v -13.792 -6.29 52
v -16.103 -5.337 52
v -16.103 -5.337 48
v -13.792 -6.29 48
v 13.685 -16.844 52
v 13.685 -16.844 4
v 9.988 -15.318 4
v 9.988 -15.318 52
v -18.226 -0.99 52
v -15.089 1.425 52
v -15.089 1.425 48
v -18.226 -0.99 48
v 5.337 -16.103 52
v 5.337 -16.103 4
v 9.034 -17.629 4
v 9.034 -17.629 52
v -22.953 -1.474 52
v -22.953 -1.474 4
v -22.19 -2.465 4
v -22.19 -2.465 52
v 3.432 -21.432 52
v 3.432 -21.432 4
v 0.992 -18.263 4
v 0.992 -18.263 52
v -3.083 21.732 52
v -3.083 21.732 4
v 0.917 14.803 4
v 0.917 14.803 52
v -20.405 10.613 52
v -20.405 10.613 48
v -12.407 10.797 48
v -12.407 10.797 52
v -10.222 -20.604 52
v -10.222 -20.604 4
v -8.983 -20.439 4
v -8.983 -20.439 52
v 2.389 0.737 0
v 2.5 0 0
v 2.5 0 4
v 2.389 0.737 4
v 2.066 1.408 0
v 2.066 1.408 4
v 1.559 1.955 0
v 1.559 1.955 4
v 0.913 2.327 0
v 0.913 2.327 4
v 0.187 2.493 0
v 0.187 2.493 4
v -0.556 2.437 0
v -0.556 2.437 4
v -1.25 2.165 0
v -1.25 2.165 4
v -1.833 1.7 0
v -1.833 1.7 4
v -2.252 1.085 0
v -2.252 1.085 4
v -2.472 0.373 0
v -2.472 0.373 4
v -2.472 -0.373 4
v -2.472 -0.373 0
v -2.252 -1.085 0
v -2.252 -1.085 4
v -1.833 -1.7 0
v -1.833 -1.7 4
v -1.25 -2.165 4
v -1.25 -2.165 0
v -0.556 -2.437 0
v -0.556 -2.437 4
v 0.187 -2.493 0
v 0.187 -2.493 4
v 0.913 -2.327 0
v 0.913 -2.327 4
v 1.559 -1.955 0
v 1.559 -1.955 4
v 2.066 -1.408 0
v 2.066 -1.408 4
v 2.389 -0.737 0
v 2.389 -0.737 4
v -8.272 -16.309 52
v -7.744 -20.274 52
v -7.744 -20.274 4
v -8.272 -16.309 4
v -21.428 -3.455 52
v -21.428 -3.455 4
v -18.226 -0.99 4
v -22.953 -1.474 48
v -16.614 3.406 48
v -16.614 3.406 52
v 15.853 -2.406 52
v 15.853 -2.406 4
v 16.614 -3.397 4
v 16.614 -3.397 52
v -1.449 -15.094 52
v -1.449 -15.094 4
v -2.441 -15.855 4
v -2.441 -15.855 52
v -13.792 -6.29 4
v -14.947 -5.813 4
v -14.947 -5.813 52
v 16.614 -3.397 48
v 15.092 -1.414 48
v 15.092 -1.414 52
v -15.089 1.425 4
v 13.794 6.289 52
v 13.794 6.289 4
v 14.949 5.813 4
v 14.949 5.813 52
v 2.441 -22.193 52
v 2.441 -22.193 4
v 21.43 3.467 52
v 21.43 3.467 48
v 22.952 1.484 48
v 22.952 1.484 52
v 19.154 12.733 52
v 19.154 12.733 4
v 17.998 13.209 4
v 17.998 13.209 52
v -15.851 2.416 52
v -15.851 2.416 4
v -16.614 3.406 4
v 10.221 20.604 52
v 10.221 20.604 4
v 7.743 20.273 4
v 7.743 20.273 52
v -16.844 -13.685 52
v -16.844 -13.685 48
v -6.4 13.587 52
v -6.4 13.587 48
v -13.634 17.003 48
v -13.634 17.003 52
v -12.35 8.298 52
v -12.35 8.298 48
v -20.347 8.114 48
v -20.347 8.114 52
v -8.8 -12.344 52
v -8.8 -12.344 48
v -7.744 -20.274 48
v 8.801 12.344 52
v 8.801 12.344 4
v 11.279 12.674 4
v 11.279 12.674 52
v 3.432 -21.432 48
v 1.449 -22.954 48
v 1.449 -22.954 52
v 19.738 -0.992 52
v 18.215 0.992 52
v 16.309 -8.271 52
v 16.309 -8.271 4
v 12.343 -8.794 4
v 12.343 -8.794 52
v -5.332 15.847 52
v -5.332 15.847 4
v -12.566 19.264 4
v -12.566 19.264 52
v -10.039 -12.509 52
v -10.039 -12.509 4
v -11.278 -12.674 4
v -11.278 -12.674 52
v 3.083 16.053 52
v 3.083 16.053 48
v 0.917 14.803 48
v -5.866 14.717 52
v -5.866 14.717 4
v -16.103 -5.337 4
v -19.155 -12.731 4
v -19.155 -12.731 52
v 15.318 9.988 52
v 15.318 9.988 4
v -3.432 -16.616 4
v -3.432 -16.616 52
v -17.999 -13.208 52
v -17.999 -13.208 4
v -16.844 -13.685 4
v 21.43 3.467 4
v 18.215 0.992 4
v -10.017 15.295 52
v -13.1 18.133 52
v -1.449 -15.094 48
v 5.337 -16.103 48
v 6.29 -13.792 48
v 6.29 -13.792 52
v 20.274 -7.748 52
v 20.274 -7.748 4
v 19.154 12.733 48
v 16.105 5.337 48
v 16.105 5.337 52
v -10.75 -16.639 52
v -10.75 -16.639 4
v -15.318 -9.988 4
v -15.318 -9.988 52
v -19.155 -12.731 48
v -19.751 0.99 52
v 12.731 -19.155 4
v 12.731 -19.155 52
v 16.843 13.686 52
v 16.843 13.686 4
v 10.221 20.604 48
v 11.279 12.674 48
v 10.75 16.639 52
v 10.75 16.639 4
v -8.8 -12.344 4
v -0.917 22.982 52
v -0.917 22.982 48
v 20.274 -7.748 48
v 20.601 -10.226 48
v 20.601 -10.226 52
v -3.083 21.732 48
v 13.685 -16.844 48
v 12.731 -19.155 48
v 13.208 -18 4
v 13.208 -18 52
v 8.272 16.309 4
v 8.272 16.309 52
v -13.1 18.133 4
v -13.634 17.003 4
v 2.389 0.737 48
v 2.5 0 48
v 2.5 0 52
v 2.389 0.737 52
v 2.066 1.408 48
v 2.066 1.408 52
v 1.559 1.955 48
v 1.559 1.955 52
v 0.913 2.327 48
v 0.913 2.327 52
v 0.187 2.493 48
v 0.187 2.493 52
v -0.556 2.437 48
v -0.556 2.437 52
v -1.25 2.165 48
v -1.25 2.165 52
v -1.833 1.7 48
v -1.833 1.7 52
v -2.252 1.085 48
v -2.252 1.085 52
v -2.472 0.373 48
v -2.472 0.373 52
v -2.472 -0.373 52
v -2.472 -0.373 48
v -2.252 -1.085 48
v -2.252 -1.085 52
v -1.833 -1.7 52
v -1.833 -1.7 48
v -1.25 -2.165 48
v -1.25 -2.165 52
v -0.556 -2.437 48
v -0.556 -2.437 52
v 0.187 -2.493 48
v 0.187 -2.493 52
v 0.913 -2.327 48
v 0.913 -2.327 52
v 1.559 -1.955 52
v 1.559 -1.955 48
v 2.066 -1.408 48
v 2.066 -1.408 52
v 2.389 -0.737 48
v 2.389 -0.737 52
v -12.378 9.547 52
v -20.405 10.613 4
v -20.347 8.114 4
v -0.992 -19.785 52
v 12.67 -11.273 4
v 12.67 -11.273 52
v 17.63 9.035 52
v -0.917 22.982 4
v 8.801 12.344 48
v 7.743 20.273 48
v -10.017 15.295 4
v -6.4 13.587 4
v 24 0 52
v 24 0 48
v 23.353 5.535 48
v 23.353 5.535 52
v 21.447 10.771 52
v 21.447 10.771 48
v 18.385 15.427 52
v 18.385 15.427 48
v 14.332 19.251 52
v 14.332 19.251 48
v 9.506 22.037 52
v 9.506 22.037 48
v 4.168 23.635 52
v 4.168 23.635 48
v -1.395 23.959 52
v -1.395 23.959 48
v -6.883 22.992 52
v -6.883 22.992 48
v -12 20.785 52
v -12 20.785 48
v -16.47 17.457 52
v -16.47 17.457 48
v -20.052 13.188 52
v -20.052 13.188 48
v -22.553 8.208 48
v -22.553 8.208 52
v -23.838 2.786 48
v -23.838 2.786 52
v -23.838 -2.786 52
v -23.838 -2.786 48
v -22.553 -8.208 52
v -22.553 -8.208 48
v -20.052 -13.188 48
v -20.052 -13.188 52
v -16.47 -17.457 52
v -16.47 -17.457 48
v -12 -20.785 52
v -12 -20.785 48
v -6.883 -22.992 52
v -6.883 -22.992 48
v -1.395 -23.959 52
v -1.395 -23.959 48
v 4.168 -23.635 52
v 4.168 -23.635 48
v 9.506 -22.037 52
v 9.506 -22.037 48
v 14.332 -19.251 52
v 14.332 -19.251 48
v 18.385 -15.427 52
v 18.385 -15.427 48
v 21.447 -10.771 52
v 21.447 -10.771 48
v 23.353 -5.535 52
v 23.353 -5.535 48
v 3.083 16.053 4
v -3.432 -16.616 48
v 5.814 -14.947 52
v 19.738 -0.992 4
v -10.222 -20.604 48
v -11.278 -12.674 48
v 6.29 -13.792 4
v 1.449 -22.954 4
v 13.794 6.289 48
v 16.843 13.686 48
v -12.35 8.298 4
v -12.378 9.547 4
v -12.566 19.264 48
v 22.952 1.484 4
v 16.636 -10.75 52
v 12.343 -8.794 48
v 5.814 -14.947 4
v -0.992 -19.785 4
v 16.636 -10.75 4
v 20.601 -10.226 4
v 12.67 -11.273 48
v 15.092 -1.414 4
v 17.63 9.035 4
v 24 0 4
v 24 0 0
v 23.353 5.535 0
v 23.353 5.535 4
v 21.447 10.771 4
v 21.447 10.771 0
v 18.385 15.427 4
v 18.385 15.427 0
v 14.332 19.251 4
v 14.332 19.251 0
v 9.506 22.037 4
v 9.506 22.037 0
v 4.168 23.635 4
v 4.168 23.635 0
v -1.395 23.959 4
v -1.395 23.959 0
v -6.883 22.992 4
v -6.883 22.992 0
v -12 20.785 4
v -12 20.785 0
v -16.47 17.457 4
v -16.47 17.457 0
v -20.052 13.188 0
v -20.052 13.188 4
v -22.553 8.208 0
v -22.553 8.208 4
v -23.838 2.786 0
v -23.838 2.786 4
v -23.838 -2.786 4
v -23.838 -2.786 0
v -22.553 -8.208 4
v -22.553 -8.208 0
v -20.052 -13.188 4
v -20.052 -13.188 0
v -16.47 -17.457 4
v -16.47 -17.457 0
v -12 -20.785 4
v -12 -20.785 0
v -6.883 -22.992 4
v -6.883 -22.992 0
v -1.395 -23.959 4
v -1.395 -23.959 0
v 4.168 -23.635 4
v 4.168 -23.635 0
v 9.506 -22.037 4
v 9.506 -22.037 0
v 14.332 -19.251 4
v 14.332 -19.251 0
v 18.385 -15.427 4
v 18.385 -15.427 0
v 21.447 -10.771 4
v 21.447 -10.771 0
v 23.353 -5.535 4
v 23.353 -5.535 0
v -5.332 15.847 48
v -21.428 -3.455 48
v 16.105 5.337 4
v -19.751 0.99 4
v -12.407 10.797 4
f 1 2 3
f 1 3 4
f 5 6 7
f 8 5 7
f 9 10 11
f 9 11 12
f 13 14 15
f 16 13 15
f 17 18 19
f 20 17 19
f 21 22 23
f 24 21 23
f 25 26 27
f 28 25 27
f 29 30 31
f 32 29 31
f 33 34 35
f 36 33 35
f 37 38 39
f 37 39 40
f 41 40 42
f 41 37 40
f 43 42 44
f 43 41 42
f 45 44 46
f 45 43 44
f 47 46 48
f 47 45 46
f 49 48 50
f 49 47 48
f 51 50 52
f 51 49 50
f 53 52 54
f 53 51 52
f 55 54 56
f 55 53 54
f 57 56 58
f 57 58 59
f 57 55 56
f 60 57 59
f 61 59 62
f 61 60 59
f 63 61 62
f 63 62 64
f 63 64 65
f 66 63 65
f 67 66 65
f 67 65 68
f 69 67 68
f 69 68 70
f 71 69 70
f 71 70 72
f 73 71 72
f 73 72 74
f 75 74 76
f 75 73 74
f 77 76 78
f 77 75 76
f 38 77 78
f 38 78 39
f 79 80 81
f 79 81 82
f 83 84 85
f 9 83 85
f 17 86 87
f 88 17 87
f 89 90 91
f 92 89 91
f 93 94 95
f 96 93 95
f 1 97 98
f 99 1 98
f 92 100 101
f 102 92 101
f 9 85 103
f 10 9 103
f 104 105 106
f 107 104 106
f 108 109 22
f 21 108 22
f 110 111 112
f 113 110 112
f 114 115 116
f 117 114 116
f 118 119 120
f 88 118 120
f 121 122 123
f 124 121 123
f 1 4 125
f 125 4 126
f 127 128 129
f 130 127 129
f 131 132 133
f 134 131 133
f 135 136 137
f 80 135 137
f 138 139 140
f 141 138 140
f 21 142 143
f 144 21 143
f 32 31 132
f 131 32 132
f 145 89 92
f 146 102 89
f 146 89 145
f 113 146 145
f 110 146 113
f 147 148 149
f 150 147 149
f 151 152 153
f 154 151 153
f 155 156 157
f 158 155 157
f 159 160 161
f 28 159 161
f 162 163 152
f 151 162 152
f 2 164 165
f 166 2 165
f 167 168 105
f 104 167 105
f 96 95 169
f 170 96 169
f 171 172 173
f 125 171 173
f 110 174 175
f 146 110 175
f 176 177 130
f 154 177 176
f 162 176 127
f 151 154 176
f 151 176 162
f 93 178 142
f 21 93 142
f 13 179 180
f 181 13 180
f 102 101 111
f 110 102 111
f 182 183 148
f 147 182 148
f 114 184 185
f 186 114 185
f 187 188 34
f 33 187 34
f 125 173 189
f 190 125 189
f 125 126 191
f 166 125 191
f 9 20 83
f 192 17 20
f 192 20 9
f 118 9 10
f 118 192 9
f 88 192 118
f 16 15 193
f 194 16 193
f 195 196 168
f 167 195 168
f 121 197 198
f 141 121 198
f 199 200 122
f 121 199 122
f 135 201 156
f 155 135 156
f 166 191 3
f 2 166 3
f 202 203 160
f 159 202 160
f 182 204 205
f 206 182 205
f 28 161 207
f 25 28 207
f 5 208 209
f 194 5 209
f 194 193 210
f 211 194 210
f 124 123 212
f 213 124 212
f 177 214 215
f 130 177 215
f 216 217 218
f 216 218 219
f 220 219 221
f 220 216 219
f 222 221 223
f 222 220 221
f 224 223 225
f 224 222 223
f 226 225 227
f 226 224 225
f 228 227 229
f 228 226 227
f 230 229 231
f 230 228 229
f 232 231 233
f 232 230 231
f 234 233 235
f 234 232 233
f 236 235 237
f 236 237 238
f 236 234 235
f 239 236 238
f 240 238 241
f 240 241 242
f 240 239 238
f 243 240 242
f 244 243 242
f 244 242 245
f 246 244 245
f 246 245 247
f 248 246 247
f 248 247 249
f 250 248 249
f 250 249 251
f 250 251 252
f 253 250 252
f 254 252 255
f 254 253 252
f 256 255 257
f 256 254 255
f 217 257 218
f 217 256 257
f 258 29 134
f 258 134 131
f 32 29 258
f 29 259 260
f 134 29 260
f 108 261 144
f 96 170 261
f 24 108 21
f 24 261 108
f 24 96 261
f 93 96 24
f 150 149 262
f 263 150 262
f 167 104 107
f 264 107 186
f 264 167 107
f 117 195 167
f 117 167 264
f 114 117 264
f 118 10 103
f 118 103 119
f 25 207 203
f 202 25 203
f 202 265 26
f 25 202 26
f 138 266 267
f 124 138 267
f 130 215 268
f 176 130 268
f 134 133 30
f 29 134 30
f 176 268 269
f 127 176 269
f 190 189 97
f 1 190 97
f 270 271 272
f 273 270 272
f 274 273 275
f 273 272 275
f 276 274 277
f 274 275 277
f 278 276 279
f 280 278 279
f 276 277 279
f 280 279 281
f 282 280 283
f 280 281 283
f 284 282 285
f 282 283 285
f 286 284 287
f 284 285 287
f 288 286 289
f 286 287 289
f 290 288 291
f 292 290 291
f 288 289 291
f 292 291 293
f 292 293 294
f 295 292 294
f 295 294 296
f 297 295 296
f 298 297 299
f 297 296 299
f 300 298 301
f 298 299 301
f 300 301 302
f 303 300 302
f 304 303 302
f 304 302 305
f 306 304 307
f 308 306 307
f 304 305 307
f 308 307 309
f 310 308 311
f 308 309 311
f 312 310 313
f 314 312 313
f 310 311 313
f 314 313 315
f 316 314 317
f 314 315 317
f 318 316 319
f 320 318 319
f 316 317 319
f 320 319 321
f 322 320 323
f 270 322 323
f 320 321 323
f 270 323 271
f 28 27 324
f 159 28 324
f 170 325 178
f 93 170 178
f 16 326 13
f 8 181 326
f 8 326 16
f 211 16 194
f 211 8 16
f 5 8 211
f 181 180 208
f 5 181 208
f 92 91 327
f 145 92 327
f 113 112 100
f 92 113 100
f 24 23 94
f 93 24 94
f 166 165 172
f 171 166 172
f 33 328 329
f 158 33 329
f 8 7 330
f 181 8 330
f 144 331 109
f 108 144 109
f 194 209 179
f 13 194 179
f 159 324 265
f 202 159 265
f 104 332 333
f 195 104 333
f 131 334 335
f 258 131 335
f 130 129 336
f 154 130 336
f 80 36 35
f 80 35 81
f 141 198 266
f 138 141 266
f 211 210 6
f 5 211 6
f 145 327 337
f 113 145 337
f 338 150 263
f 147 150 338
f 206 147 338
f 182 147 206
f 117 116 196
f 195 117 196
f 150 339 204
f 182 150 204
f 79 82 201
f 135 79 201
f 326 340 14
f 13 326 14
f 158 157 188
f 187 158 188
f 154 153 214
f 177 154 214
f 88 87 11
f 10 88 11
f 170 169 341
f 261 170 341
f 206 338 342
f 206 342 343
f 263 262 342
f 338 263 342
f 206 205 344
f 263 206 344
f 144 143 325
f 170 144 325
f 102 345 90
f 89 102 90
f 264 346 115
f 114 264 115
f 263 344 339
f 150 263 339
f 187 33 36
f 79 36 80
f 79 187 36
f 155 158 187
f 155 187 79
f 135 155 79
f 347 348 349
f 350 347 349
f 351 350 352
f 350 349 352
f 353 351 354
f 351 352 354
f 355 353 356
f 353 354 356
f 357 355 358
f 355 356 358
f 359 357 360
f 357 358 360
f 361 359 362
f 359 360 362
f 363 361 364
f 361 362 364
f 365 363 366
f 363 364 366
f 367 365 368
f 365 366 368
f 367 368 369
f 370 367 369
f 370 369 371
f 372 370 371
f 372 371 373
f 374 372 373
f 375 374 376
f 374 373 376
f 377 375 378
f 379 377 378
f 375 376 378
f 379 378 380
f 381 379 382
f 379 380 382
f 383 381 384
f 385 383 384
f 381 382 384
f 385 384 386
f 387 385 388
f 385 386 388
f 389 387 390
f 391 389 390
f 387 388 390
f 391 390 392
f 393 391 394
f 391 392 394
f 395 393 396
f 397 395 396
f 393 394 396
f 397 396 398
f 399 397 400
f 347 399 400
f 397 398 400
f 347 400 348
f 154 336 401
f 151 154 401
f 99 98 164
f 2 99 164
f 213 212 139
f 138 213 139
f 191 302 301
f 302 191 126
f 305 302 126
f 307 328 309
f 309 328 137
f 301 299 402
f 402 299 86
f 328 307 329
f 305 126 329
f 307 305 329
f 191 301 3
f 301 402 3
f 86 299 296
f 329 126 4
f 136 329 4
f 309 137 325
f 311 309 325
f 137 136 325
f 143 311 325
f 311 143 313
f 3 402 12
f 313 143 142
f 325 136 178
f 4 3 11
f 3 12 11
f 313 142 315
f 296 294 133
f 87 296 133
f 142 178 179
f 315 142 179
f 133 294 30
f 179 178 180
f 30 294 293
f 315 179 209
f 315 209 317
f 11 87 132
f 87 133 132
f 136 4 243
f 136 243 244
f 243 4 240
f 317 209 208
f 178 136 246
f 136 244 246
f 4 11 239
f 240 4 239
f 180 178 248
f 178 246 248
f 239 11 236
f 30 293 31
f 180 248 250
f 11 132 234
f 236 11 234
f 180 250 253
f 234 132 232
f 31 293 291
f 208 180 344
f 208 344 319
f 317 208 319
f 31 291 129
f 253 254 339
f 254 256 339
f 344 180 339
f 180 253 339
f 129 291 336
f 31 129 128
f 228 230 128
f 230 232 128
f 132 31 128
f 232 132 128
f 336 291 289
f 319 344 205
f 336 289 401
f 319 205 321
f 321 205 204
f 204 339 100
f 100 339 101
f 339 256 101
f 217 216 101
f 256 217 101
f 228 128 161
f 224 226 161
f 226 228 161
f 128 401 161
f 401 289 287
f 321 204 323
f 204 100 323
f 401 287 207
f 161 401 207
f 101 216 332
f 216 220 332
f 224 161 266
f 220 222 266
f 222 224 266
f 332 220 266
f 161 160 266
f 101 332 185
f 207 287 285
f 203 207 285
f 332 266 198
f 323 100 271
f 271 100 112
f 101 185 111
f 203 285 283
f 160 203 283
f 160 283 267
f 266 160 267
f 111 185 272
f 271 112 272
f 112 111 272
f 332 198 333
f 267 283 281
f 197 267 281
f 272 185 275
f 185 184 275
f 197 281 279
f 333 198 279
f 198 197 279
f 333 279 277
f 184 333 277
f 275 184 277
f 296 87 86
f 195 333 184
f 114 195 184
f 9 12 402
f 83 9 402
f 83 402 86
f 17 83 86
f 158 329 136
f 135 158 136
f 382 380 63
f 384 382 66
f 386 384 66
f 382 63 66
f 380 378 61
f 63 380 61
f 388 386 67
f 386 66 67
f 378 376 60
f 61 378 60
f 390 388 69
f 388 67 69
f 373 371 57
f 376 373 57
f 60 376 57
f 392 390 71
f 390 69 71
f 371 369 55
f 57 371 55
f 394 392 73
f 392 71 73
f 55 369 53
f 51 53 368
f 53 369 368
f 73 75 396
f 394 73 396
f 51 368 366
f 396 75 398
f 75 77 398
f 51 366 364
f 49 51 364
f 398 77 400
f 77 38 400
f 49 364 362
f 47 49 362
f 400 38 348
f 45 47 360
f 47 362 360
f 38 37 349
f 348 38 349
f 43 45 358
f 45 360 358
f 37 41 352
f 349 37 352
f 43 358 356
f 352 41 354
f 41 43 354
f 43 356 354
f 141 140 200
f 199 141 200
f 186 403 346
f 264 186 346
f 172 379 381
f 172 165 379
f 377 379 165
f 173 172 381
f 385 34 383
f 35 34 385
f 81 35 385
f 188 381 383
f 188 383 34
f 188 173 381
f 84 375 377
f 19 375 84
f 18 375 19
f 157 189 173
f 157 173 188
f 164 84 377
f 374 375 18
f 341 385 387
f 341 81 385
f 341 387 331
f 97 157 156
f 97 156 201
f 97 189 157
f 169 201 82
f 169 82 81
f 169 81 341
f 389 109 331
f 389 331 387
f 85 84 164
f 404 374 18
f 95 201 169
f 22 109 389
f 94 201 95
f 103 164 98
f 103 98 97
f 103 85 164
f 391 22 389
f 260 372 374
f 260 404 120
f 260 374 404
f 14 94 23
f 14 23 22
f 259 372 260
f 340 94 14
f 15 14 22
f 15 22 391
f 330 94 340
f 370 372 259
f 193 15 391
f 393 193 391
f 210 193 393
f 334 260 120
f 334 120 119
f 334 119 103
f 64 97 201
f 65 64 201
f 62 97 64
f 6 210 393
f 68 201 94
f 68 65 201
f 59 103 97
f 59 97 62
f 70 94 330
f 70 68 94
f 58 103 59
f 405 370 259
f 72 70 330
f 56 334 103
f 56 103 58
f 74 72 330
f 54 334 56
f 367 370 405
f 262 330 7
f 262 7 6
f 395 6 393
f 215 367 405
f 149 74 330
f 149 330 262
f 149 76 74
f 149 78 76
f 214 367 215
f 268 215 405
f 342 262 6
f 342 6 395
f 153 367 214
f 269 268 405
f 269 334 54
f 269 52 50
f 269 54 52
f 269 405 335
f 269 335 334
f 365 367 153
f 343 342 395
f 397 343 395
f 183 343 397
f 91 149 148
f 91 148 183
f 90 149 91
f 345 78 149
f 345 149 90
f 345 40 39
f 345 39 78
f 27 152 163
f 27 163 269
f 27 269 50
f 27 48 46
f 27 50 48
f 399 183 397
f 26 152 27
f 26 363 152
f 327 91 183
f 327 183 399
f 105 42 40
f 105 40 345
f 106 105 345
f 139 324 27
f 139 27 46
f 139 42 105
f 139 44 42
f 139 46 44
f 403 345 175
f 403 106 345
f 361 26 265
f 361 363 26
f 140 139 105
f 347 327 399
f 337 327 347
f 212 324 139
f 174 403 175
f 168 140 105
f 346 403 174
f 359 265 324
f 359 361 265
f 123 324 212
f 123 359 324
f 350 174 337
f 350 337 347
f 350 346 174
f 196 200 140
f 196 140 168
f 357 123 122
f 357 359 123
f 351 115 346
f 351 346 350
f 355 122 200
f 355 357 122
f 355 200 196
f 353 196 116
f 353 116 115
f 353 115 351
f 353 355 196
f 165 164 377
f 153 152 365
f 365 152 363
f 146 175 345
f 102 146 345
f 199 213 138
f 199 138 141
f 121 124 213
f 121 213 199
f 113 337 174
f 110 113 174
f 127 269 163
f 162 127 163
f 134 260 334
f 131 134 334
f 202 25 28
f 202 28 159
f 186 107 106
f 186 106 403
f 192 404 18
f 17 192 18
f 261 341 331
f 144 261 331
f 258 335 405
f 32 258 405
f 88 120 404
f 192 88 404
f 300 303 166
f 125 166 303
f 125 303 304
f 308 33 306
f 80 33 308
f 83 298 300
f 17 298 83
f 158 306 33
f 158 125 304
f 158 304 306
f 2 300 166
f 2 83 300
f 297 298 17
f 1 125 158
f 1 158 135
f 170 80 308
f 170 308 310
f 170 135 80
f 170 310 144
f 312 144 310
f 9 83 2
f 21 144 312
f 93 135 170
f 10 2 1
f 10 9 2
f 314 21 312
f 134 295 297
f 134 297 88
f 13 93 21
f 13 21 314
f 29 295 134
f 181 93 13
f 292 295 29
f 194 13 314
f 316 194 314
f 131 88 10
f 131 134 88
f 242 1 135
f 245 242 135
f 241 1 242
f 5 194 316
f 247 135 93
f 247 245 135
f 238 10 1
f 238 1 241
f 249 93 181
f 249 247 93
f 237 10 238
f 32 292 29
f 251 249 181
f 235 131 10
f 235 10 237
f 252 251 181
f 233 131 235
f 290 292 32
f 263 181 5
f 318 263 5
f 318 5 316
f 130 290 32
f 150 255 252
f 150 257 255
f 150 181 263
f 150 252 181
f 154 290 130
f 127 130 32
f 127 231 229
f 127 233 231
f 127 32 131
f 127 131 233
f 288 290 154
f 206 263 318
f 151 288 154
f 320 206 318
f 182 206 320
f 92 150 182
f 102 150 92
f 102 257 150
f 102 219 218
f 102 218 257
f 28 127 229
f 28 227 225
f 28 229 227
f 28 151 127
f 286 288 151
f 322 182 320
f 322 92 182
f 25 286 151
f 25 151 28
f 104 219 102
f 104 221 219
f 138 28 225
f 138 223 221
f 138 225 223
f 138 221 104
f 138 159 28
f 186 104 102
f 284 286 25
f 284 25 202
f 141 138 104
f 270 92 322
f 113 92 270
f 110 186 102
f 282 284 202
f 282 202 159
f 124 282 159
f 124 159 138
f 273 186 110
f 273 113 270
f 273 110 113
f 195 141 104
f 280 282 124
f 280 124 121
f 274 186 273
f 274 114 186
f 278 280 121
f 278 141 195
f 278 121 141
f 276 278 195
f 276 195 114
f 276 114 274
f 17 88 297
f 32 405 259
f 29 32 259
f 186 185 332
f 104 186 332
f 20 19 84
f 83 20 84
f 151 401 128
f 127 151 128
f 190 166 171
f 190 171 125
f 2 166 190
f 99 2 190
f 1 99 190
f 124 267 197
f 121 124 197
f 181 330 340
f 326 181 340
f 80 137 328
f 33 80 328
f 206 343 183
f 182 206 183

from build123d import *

# Parameters (mm, degrees)
F0_R        = 24
F0_R_2      = 2.5
F1_DEPTH    = 4
F2_DEPTH    = 52
F3_START    = 44
F1_FACE_R   = 24
F1_FACE_R_2 = 2.5
F3_DEPTH    = 4


# Not quite as in the source:
# - ends of sketch curves that miss each other by under 0.0002 mm in the source are joined


with BuildPart() as f1:
    # F0 (on Top) → F1 (new body)
    with BuildSketch(Plane.XY):
        Circle(F0_R)
        Polygon((-8.9827740816, -20.4386470385), (-10.2218230987, -20.6037455949), (-10.7501384793, -16.6387887403), (-11.2784538598, -12.6738318857), (-10.0394048428, -12.5087333293), (-8.8003558257, -12.3436347729), (-8.2720404452, -16.3085916275), (-7.7437250646, -20.273548482), align=None, mode=Mode.SUBTRACT)
        Polygon((-17.9994299012, -13.2083639741), (-19.154884362, -12.7314730129), (-17.6288332862, -9.0340187381), (-16.1027822104, -5.3365644633), (-14.9473277496, -5.8134554245), (-13.7918732887, -6.2903463857), (-15.3179243645, -9.9878006605), (-16.8439754403, -13.6852549352), align=None, mode=Mode.SUBTRACT)
        Polygon((-22.1901674017, -2.4646747911), (-22.9527062815, -1.4742029558), (-19.7513076007, 0.9904718354), (-16.613686535, 3.4060458753), (-15.8511476551, 2.4155740399), (-15.0886087753, 1.4251022046), (-18.226229841, -0.9904718354), (-21.4276285218, -3.4551466265), align=None, mode=Mode.SUBTRACT)
        Polygon((2.4405882298, -22.1931875166), (1.4490252381, -22.954309527), (-0.9915629917, -19.7851505161), (-3.4321512214, -16.6159915053), (-2.4405882298, -15.8548694949), (-1.4490252381, -15.0937474845), (0.9915629917, -18.2629064954), (3.4321512214, -21.4320655062), align=None, mode=Mode.SUBTRACT)
        Polygon((13.2082589659, -17.9995611772), (12.7313109402, -19.1549920841), (9.0339320379, -17.6287584019), (5.3365531356, -16.1025247196), (5.8135011613, -14.9470938127), (6.290449187, -13.7916629057), (9.9878280893, -15.3178965879), (13.6852069916, -16.8441302702), align=None, mode=Mode.SUBTRACT)
        Polygon((20.4379798112, -8.9871546743), (20.6014655966, -10.2264175189), (16.6358244939, -10.7495720322), (12.6701833913, -11.2727265454), (12.5066976059, -10.0334637008), (12.3432118205, -8.7942008562), (16.3088529232, -8.271046343), (20.2744940258, -7.7478918297), align=None, mode=Mode.SUBTRACT)
        Polygon((-20.3762131188, 9.3633951434), (-20.4049716149, 10.6130642792), (-16.4060303805, 10.7050914668), (-12.407089146, 10.7971186544), (-12.3783306499, 9.5474495186), (-12.3495721537, 8.2977803828), (-16.3485133882, 8.2057531952), (-20.3474546227, 8.1137260076), align=None, mode=Mode.SUBTRACT)
        Polygon((-13.1000797836, 18.1333488537), (-12.5662981354, 19.2636484388), (-8.9493394632, 17.5555471644), (-5.332380791, 15.84744589), (-5.8661624392, 14.7171463049), (-6.3999440875, 13.5868467198), (-10.0169027597, 15.2949479943), (-13.6338614319, 17.0030492687), align=None, mode=Mode.SUBTRACT)
        Circle(F0_R_2, mode=Mode.SUBTRACT)
        Polygon((22.1909529643, 2.4755624376), (22.9520749747, 1.4839994459), (19.737501164, -0.9915629917), (16.613756953, -3.3971770136), (15.8526349426, -2.4056140219), (15.0915129323, -1.4140510302), (18.2152571432, 0.9915629917), (21.4298309539, 3.4671254293), align=None, mode=Mode.SUBTRACT)
        Polygon((17.9982494725, 13.2093081016), (19.1539156294, 12.73293038), (17.6295069203, 9.0347986777), (16.1050982111, 5.3366669754), (14.9494320542, 5.813044697), (13.7937658972, 6.2894224186), (15.3181746063, 9.9875541209), (16.8425833155, 13.6856858232), align=None, mode=Mode.SUBTRACT)
        Polygon((8.9820708555, 20.4387540345), (10.2210853338, 20.6041115945), (10.7502295258, 16.6392652641), (11.2793737179, 12.6744189336), (10.0403592396, 12.5090613736), (8.8013447613, 12.3437038136), (8.2722005693, 16.3085501441), (7.7430563772, 20.2733964745), align=None, mode=Mode.SUBTRACT)
        Polygon((-2, 22.3566939084), (-0.9174682099, 22.9816938471), (1.0825317901, 19.517592232), (3.0825317901, 16.0534906169), (2, 15.4284906782), (0.9174682099, 14.8034907395), (-3.0825317901, 14.8034907395), (-3.0825317901, 21.7316939697), align=None, mode=Mode.SUBTRACT)
        Polygon((-1.0825317901, 18.2675923546), (-3.0825317901, 21.7316939697), (-3.0825317901, 14.8034907395), (0.9174682099, 14.8034907395), align=None)
    extrude(amount=F1_DEPTH)

    # F0 (on Top) → F2 (join)
    with BuildSketch(Plane.XY):
        Polygon((11.2793737179, 12.6744189336), (10.7502295258, 16.6392652641), (9.5112150476, 16.4739077041), (10.0403592396, 12.5090613736), align=None)
        Polygon((10.0403592396, 12.5090613736), (9.5112150476, 16.4739077041), (8.2722005693, 16.3085501441), (8.8013447613, 12.3437038136), align=None)
        Polygon((10.7502295258, 16.6392652641), (10.2210853338, 20.6041115945), (8.9820708555, 20.4387540345), (9.5112150476, 16.4739077041), align=None)
        Polygon((9.5112150476, 16.4739077041), (8.9820708555, 20.4387540345), (7.7430563772, 20.2733964745), (8.2722005693, 16.3085501441), align=None)
        Polygon((3.0825317901, 16.0534906169), (1.0825317901, 19.517592232), (0, 18.8925922933), (2, 15.4284906782), align=None)
        Polygon((2, 15.4284906782), (0, 18.8925922933), (-1.0825317901, 18.2675923546), (0.9174682099, 14.8034907395), align=None)
        Polygon((1.0825317901, 19.517592232), (-0.9174682099, 22.9816938471), (-2, 22.3566939084), (0, 18.8925922933), align=None)
        Polygon((0, 18.8925922933), (-2, 22.3566939084), (-3.0825317901, 21.7316939697), (-1.0825317901, 18.2675923546), align=None)
        Polygon((-8.9493394632, 17.5555471644), (-12.5662981354, 19.2636484388), (-13.1000797836, 18.1333488537), (-9.4831211114, 16.4252475793), align=None)
        Polygon((-9.4831211114, 16.4252475793), (-13.1000797836, 18.1333488537), (-13.6338614319, 17.0030492687), (-10.0169027597, 15.2949479943), align=None)
        Polygon((-5.332380791, 15.84744589), (-8.9493394632, 17.5555471644), (-9.4831211114, 16.4252475793), (-5.8661624392, 14.7171463049), align=None)
        Polygon((-5.8661624392, 14.7171463049), (-9.4831211114, 16.4252475793), (-10.0169027597, 15.2949479943), (-6.3999440875, 13.5868467198), align=None)
        Polygon((-12.407089146, 10.7971186544), (-16.4060303805, 10.7050914668), (-16.3772718843, 9.455422331), (-12.3783306499, 9.5474495186), align=None)
        Polygon((-16.4060303805, 10.7050914668), (-20.4049716149, 10.6130642792), (-20.3762131188, 9.3633951434), (-16.3772718843, 9.455422331), align=None)
        Polygon((-16.3772718843, 9.455422331), (-20.3762131188, 9.3633951434), (-20.3474546227, 8.1137260076), (-16.3485133882, 8.2057531952), align=None)
        Polygon((-12.3783306499, 9.5474495186), (-16.3772718843, 9.455422331), (-16.3485133882, 8.2057531952), (-12.3495721537, 8.2977803828), align=None)
        Polygon((-16.613686535, 3.4060458753), (-19.7513076007, 0.9904718354), (-18.9887687209, 0), (-15.8511476551, 2.4155740399), align=None)
        Polygon((-19.7513076007, 0.9904718354), (-22.9527062815, -1.4742029558), (-22.1901674017, -2.4646747911), (-18.9887687209, 0), align=None)
        Polygon((-18.9887687209, 0), (-22.1901674017, -2.4646747911), (-21.4276285218, -3.4551466265), (-18.226229841, -0.9904718354), align=None)
        Polygon((-15.8511476551, 2.4155740399), (-18.9887687209, 0), (-18.2262279469, -0.9904742957), (-15.0886087753, 1.4251022046), align=None)
        Polygon((-16.1027822104, -5.3365644633), (-17.6288332862, -9.0340187381), (-16.4733788254, -9.5109096993), (-14.9473277496, -5.8134554245), align=None)
        Polygon((-14.9473277496, -5.8134554245), (-16.4733788254, -9.5109096993), (-15.3179243645, -9.9878006605), (-13.7918732887, -6.2903463857), align=None)
        Polygon((-16.4733788254, -9.5109096993), (-17.9994299012, -13.2083639741), (-16.8439754403, -13.6852549352), (-15.3179243645, -9.9878006605), align=None)
        Polygon((-17.6288332862, -9.0340187381), (-19.154884362, -12.7314730129), (-17.9994299012, -13.2083639741), (-16.4733788254, -9.5109096993), align=None)
        Polygon((-10.7501384793, -16.6387887403), (-10.2218230987, -20.6037455949), (-8.9827740816, -20.4386470385), (-9.5110894622, -16.4736901839), align=None)
        Polygon((-9.5110894622, -16.4736901839), (-8.9827740816, -20.4386470385), (-7.7437250646, -20.273548482), (-8.2720404452, -16.3085916275), align=None)
        Polygon((-11.2784538598, -12.6738318857), (-10.7501384793, -16.6387887403), (-9.5110894622, -16.4736901839), (-10.0394048428, -12.5087333293), align=None)
        Polygon((-10.0394048428, -12.5087333293), (-9.5110894622, -16.4736901839), (-8.2720404452, -16.3085916275), (-8.8003558257, -12.3436347729), align=None)
        Polygon((-3.4321512214, -16.6159915053), (-0.9915629917, -19.7851505161), (0, -19.0240285057), (-2.4405882298, -15.8548694949), align=None)
        Polygon((-2.4405882298, -15.8548694949), (0, -19.0240285057), (0.9915629917, -18.2629064954), (-1.4490252381, -15.0937474845), align=None)
        Polygon((0, -19.0240285057), (2.4405882298, -22.1931875166), (3.4321512214, -21.4320655062), (0.9915629917, -18.2629064954), align=None)
        Polygon((-0.9915629917, -19.7851505161), (1.4490252381, -22.954309527), (2.4405882298, -22.1931875166), (0, -19.0240285057), align=None)
        Polygon((9.0339320379, -17.6287584019), (12.7313109402, -19.1549920841), (13.2082589659, -17.9995611772), (9.5108800636, -16.4733274949), align=None)
        Polygon((5.3365531356, -16.1025247196), (9.0339320379, -17.6287584019), (9.5108800636, -16.4733274949), (5.8135011613, -14.9470938127), align=None)
        Polygon((5.8135011613, -14.9470938127), (9.5108800636, -16.4733274949), (9.9878280893, -15.3178965879), (6.290449187, -13.7916629057), align=None)
        Polygon((9.5108800636, -16.4733274949), (13.2082589659, -17.9995611772), (13.6852069916, -16.8441302702), (9.9878280893, -15.3178965879), align=None)
        Polygon((12.6701833913, -11.2727265454), (16.6358244939, -10.7495720322), (16.4723387086, -9.5103091876), (12.5066976059, -10.0334637008), align=None)
        Polygon((16.6358244939, -10.7495720322), (20.6014655966, -10.2264175189), (20.4379798112, -8.9871546743), (16.4723387086, -9.5103091876), align=None)
        Polygon((12.5066976059, -10.0334637008), (16.4723387086, -9.5103091876), (16.3088529232, -8.271046343), (12.3432118205, -8.7942008562), align=None)
        Polygon((16.4723387086, -9.5103091876), (20.4379798112, -8.9871546743), (20.2744940258, -7.7478918297), (16.3088529232, -8.271046343), align=None)
        Polygon((16.613756953, -3.3971770136), (19.737501164, -0.9915629917), (18.9763791536, 0), (15.8526349426, -2.4056140219), align=None)
        Polygon((19.737501164, -0.9915629917), (22.9520749747, 1.4839994459), (22.1909529643, 2.4755624376), (18.9763791536, 0), align=None)
        Polygon((18.9763791536, 0), (22.1909529643, 2.4755624376), (21.4298309539, 3.4671254293), (18.2152571432, 0.9915629917), align=None)
        Polygon((15.8526349426, -2.4056140219), (18.9763791536, 0), (18.2152571432, 0.9915629917), (15.0915129323, -1.4140510302), align=None)
        Polygon((16.1050982111, 5.3366669754), (17.6295069203, 9.0347986777), (16.4738407633, 9.5111763993), (14.9494320542, 5.813044697), align=None)
        Polygon((14.9494320542, 5.813044697), (16.4738407633, 9.5111763993), (15.3181746063, 9.9875541209), (13.7937658972, 6.2894224186), align=None)
        Polygon((16.4738407633, 9.5111763993), (17.9982494725, 13.2093081016), (16.8425833155, 13.6856858232), (15.3181746063, 9.9875541209), align=None)
        Polygon((17.6295069203, 9.0347986777), (19.1539156294, 12.73293038), (17.9982494725, 13.2093081016), (16.4738407633, 9.5111763993), align=None)
    extrude(amount=F2_DEPTH)


with BuildPart() as f3:
    # F1_face (on face) → F3 (new body)
    with BuildSketch(Plane(origin=(-0.0016074104, 0.0028842551, 4), x_dir=(1, 0, 0), z_dir=(0, 0, 1)).offset(F3_START)):
        with Locations((0.0016074104, -0.0028842551)):
            Circle(F1_FACE_R)
        Polygon((-7.7421176542, -20.2764327371), (-10.2202156883, -20.60662985), (-11.2768464494, -12.6767161408), (-8.7987484153, -12.346519028), align=None, mode=Mode.SUBTRACT)
        Polygon((-16.8423680298, -13.6881391903), (-19.1532769516, -12.734357268), (-16.1011748, -5.3394487184), (-13.7902658783, -6.2932306408), align=None, mode=Mode.SUBTRACT)
        Polygon((-18.2246224306, -0.9933560905), (-21.4260211114, -3.4580308816), (-22.9510988711, -1.4770872108), (-16.6120791246, 3.4031616202), (-15.0870013648, 1.4222179495), (-18.2246205365, -0.9933585508), align=None, mode=Mode.SUBTRACT)
        Polygon((3.4337586319, -21.4349497613), (1.4506326485, -22.9571937821), (-3.430543811, -16.6188757604), (-1.4474178276, -15.0966317396), align=None, mode=Mode.SUBTRACT)
        Polygon((13.6868144021, -16.8470145253), (12.7329183507, -19.1578763392), (5.3381605461, -16.1054089747), (6.2920565975, -13.7945471608), align=None, mode=Mode.SUBTRACT)
        with Locations((0.0016074104, -0.0028842551)):
            Circle(F1_FACE_R_2, mode=Mode.SUBTRACT)
        Polygon((20.2761014363, -7.7507760848), (20.6030730071, -10.229301774), (12.6717908017, -11.2756108005), (12.3448192309, -8.7970851113), align=None, mode=Mode.SUBTRACT)
        Polygon((-20.4033642045, 10.6101800241), (-12.4054817355, 10.7942343993), (-12.3479647433, 8.2948961277), (-20.3458472122, 8.1108417526), align=None, mode=Mode.SUBTRACT)
        Polygon((-13.6322540214, 17.0001650136), (-12.5646907249, 19.2607641837), (-5.3307733805, 15.8445616349), (-6.398336677, 13.5839624647), align=None, mode=Mode.SUBTRACT)
        Polygon((21.4314383644, 3.4642411742), (22.9536823851, 1.4811151908), (16.6153643635, -3.4000612687), (15.0931203427, -1.4169352853), align=None, mode=Mode.SUBTRACT)
        Polygon((16.8441907259, 13.6828015681), (19.1555230399, 12.7300461249), (16.1067056216, 5.3337827203), (13.7953733076, 6.2865381635), align=None, mode=Mode.SUBTRACT)
        Polygon((7.7446637877, 20.2705122194), (10.2226927442, 20.6012273394), (11.2809811283, 12.6715346785), (8.8029521718, 12.3408195585), align=None, mode=Mode.SUBTRACT)
        Polygon((-3.0809243797, 21.7288097146), (-0.9158607994, 22.978809592), (3.0841392006, 16.0506063618), (0.9190756203, 14.8006064844), align=None, mode=Mode.SUBTRACT)
    extrude(amount=F3_DEPTH)


solid = Compound([f1.part, f3.part])
